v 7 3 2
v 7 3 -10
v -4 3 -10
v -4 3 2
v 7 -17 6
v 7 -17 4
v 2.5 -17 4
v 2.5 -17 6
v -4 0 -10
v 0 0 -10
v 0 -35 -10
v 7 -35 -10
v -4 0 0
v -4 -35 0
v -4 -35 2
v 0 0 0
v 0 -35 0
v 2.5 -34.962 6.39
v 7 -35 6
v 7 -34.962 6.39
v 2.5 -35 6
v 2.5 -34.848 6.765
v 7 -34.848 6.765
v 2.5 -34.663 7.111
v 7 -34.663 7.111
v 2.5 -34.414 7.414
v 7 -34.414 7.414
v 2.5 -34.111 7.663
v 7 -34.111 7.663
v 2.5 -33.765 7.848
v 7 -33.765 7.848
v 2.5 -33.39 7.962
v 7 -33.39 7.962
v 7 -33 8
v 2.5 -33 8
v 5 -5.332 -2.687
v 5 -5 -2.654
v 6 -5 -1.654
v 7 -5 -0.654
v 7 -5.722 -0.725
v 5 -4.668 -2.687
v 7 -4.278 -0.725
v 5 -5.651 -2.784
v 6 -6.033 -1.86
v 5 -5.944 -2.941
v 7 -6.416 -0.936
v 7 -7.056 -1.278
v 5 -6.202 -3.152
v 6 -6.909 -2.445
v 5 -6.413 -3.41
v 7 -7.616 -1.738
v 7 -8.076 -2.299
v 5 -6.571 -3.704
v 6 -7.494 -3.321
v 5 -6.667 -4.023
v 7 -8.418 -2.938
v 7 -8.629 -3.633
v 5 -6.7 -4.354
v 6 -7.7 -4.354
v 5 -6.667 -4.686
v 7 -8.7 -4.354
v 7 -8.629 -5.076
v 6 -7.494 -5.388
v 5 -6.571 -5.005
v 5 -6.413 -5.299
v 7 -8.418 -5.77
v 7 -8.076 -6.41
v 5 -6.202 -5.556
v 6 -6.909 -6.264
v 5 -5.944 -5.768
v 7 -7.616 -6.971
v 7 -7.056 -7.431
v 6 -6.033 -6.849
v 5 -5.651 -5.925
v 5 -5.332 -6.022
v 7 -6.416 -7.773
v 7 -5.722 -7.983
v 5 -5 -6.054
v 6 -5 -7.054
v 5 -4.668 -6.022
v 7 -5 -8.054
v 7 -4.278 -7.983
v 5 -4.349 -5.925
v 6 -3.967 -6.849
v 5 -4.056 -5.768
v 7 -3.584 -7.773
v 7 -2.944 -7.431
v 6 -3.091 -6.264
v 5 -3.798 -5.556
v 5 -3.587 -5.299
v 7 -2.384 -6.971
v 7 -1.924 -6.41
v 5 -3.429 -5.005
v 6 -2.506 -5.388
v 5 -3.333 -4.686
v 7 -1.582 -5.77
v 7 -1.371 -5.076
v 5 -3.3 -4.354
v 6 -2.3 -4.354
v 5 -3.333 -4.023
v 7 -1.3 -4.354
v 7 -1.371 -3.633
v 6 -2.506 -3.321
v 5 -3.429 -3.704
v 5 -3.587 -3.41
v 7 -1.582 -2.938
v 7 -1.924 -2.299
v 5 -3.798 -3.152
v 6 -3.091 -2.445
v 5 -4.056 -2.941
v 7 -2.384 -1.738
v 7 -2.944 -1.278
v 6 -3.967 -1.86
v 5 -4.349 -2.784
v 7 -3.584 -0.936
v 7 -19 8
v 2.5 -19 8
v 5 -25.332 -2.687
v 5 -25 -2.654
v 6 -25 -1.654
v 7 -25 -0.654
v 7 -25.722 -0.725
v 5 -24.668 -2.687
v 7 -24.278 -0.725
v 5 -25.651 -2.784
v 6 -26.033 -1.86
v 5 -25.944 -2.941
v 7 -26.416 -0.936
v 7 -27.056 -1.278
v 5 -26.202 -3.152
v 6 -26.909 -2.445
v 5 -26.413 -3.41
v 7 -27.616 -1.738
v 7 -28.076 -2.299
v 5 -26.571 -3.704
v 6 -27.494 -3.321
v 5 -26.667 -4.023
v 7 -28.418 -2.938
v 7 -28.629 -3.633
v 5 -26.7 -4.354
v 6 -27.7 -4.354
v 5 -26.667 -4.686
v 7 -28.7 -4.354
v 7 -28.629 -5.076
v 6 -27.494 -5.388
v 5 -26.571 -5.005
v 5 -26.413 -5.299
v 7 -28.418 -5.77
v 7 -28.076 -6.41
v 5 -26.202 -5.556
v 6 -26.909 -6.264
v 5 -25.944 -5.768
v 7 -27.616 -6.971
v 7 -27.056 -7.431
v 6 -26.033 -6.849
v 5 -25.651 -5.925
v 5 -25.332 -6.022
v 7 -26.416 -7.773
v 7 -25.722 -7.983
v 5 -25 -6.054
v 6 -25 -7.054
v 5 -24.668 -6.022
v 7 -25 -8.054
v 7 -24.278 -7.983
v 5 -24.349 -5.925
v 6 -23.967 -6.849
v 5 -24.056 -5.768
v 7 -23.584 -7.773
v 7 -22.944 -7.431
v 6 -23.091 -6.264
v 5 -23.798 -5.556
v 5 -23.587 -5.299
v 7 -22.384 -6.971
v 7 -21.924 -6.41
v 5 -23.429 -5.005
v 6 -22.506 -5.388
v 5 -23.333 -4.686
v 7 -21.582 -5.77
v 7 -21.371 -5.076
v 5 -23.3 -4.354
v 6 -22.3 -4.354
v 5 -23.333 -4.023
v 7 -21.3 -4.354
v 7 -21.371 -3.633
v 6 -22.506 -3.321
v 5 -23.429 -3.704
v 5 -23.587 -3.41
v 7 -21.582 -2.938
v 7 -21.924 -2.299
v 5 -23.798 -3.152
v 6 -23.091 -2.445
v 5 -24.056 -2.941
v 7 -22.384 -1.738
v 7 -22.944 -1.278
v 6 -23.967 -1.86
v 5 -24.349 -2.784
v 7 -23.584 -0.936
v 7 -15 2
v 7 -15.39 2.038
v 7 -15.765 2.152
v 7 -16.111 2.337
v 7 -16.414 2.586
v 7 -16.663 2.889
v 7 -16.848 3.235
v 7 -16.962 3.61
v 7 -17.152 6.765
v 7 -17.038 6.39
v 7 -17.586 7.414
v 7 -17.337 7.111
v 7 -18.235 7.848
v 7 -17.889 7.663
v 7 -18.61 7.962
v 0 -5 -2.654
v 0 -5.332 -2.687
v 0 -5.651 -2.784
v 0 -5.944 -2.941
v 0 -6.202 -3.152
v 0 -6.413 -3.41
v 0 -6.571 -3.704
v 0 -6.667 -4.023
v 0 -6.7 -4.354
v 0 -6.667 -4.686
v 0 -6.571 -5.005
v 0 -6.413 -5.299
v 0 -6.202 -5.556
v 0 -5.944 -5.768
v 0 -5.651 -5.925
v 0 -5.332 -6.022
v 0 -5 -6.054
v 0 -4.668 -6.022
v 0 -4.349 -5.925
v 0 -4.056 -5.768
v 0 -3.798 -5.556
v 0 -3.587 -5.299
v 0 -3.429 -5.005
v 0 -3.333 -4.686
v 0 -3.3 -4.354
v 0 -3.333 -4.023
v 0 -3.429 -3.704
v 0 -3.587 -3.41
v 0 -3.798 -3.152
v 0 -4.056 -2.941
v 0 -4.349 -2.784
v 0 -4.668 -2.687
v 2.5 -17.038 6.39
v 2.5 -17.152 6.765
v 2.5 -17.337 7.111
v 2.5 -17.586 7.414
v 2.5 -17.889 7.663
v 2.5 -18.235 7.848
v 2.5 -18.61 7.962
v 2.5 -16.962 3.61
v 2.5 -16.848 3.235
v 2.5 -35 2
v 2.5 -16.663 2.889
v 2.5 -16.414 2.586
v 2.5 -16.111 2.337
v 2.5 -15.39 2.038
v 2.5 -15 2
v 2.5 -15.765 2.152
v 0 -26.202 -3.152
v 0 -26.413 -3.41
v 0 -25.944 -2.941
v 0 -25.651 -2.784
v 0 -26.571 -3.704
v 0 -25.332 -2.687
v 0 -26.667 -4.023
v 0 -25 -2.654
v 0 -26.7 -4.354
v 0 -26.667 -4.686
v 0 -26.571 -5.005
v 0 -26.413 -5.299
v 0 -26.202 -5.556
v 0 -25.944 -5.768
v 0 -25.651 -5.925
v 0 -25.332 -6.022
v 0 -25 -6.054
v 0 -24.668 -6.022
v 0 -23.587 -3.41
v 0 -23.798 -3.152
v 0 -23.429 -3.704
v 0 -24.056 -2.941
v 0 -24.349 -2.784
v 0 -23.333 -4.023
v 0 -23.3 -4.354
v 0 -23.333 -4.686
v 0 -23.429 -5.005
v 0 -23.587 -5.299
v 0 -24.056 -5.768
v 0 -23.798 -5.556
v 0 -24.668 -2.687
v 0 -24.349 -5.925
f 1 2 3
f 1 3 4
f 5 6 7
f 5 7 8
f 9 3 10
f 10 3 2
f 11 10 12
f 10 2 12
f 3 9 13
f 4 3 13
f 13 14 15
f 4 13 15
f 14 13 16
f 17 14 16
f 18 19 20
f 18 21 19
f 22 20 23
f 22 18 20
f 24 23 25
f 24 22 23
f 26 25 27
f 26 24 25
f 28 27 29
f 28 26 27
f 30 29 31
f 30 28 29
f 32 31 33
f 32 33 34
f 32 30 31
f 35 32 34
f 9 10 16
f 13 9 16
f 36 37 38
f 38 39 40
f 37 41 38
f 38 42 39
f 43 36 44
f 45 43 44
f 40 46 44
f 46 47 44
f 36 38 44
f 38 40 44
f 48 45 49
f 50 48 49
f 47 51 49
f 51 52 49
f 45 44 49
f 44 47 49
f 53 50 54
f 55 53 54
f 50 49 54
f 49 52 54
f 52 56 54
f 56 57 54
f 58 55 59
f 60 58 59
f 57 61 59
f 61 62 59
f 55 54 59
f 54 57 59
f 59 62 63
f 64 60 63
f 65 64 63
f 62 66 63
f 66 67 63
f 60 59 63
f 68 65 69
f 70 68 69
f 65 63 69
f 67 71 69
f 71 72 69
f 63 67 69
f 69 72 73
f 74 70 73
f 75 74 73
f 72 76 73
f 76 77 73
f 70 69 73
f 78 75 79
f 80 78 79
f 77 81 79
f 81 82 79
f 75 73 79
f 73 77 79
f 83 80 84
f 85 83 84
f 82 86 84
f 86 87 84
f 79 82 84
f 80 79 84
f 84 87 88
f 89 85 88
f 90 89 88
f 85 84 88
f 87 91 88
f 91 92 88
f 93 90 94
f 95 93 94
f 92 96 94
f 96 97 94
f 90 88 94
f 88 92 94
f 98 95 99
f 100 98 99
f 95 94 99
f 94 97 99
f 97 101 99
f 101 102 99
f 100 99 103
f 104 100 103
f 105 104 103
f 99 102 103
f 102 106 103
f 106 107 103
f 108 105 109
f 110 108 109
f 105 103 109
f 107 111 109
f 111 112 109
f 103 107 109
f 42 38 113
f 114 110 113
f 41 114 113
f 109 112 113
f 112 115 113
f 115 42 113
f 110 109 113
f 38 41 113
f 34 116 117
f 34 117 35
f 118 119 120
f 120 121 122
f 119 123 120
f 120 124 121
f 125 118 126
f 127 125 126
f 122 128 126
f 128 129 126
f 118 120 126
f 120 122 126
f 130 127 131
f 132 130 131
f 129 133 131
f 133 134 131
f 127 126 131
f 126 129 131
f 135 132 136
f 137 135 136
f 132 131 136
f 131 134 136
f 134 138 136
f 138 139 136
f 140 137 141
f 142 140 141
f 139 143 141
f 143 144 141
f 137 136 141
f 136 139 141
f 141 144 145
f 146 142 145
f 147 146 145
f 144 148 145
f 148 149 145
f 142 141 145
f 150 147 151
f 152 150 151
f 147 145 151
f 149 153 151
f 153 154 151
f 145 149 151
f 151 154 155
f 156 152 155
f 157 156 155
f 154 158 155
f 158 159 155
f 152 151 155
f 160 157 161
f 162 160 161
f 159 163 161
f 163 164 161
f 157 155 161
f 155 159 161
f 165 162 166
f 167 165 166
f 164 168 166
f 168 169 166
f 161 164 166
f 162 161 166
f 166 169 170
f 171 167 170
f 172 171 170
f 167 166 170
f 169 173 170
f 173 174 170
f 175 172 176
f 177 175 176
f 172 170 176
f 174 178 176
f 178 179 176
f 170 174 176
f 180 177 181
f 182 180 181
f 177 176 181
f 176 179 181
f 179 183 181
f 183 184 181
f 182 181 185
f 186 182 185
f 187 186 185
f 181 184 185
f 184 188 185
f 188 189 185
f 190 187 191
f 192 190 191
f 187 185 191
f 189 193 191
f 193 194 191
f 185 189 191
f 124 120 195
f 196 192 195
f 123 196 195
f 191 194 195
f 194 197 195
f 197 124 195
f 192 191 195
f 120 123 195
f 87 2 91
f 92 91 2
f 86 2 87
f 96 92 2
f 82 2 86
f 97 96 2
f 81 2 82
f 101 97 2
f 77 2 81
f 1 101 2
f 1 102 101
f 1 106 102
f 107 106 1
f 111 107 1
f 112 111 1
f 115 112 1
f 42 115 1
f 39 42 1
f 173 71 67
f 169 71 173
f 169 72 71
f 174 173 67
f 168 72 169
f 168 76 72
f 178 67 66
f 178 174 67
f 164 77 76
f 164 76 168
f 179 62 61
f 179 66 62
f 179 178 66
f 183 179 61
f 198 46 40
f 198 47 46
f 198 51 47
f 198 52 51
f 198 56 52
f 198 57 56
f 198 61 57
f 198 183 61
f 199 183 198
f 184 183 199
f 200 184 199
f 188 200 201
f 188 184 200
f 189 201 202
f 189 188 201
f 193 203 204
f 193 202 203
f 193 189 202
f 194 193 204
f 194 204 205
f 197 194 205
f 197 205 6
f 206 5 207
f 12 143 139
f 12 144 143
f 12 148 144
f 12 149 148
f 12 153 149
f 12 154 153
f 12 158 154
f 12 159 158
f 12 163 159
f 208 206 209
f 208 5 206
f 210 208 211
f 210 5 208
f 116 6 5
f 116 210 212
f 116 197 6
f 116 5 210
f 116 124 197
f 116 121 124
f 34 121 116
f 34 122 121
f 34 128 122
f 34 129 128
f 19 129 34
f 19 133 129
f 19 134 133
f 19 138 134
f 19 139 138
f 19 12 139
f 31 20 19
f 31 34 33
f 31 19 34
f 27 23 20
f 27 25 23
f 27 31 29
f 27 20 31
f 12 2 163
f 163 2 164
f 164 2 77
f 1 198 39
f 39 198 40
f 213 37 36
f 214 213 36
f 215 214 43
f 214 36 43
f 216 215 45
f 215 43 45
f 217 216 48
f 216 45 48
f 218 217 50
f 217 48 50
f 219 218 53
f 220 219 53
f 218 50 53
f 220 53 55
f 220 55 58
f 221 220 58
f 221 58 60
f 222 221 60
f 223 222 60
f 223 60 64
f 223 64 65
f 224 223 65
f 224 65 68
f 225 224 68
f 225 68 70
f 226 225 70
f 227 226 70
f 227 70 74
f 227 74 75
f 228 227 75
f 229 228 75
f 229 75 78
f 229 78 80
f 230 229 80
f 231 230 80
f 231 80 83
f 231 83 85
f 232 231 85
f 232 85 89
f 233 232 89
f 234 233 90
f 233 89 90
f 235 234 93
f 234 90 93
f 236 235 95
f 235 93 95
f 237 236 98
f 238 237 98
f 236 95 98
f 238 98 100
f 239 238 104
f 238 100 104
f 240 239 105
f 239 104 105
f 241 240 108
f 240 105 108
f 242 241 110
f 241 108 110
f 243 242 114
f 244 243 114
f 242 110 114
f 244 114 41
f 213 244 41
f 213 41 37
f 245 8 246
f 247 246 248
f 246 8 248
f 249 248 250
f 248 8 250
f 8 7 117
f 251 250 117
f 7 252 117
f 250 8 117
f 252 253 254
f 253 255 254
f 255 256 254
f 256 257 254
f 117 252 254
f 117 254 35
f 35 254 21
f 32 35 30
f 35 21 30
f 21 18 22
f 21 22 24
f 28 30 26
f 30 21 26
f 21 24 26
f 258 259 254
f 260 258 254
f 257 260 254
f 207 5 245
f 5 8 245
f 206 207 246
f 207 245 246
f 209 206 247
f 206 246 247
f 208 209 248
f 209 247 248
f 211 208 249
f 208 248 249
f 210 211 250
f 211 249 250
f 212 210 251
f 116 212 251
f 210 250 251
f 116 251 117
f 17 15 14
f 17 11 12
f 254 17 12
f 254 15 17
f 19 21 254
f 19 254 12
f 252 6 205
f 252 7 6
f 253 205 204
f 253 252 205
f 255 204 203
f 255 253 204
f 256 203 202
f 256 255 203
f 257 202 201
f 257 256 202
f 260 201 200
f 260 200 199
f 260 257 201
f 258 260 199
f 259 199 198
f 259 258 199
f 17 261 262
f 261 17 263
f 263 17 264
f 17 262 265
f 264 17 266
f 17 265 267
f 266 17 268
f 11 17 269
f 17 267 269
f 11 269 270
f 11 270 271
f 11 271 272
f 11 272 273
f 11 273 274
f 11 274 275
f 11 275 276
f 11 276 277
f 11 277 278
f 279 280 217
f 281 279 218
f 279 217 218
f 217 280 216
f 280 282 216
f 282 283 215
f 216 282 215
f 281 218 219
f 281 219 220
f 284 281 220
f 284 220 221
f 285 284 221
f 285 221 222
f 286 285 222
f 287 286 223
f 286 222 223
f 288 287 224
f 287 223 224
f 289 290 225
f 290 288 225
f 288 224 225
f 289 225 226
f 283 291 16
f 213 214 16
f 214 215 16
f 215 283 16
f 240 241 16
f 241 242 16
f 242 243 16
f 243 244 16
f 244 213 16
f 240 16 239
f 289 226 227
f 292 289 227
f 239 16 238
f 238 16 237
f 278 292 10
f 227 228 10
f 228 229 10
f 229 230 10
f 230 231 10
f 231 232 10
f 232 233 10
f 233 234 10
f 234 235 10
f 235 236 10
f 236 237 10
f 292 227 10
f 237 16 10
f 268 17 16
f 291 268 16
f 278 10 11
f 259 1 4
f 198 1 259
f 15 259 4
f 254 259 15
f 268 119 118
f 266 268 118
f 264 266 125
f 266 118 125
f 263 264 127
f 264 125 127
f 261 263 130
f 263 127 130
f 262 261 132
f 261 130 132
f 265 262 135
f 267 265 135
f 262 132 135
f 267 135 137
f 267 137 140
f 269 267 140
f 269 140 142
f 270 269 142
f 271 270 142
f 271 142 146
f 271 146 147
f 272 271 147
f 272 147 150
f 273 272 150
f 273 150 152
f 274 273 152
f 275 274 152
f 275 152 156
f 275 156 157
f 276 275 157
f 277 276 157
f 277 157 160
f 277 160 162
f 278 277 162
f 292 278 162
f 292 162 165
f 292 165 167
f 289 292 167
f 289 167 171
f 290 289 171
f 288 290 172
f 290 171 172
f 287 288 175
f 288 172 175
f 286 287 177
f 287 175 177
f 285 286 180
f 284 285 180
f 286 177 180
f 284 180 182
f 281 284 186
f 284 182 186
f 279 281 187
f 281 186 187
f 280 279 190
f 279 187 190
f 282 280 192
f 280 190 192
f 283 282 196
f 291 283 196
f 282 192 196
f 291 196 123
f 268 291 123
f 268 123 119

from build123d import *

# Parameters (mm, degrees)
PAD009_DEPTH    = 35
SKETCH016_R     = 1.7
POCKET005_DEPTH = 11.001
CHAMFER_SIZE    = 2
SKETCH017_W     = 12
SKETCH017_H     = 3
PAD010_DEPTH    = 11
SKETCH019_W     = 6
SKETCH019_H     = 18
PAD011_DEPTH    = 4.5
FILLET_R        = 2


with BuildPart() as part:
    # Sketch015 → Pad009 (new body)
    with BuildSketch(Plane.XZ):
        Polygon((-4, 0), (0, 0), (0, -10), (7, -10), (7, 2), (-4, 2), align=None)
    extrude(amount=PAD009_DEPTH)

    # Sketch016 (on Face4 of Pad009) → Pocket005 (cut, through all)
    with BuildSketch(Plane(origin=(7, 0, 0), x_dir=(0, 0, 1), z_dir=(1, 0, 0))):
        with Locations((-4.354385, 25)):
            Circle(SKETCH016_R)
        with Locations((-4.354385, 5)):
            Circle(SKETCH016_R)
    extrude(amount=-POCKET005_DEPTH, mode=Mode.SUBTRACT)

    # Chamfer
    chamfer_edges = [part.edges().sort_by_distance(p)[0] for p in [
        (7, -25, -6.054385),
        (7, -5, -6.054385),
    ]]
    chamfer(chamfer_edges, length=CHAMFER_SIZE)

    # Sketch017 (on Face4 of Chamfer) → Pad010 (join)
    with BuildSketch(Plane(origin=(7, 0, 0), x_dir=(0, 0, 1), z_dir=(1, 0, 0))):
        with Locations((-4, -1.5)):
            Rectangle(SKETCH017_W, SKETCH017_H)
    extrude(amount=-PAD010_DEPTH)

    # Sketch019 (on Face4 of Pad010) → Pad011 (join)
    with BuildSketch(Plane(origin=(7, 0, 0), x_dir=(0, 0, 1), z_dir=(1, 0, 0))):
        with Locations((5, 26)):
            Rectangle(SKETCH019_W, SKETCH019_H)
    extrude(amount=-PAD011_DEPTH)

    # Fillet
    fillet_edges = [part.edges().sort_by_distance(p)[0] for p in [
        (4.75, -17, 2),
        (4.75, -17, 8),
        (4.75, -35, 8),
    ]]
    fillet(fillet_edges, radius=FILLET_R)


solid = part.part
